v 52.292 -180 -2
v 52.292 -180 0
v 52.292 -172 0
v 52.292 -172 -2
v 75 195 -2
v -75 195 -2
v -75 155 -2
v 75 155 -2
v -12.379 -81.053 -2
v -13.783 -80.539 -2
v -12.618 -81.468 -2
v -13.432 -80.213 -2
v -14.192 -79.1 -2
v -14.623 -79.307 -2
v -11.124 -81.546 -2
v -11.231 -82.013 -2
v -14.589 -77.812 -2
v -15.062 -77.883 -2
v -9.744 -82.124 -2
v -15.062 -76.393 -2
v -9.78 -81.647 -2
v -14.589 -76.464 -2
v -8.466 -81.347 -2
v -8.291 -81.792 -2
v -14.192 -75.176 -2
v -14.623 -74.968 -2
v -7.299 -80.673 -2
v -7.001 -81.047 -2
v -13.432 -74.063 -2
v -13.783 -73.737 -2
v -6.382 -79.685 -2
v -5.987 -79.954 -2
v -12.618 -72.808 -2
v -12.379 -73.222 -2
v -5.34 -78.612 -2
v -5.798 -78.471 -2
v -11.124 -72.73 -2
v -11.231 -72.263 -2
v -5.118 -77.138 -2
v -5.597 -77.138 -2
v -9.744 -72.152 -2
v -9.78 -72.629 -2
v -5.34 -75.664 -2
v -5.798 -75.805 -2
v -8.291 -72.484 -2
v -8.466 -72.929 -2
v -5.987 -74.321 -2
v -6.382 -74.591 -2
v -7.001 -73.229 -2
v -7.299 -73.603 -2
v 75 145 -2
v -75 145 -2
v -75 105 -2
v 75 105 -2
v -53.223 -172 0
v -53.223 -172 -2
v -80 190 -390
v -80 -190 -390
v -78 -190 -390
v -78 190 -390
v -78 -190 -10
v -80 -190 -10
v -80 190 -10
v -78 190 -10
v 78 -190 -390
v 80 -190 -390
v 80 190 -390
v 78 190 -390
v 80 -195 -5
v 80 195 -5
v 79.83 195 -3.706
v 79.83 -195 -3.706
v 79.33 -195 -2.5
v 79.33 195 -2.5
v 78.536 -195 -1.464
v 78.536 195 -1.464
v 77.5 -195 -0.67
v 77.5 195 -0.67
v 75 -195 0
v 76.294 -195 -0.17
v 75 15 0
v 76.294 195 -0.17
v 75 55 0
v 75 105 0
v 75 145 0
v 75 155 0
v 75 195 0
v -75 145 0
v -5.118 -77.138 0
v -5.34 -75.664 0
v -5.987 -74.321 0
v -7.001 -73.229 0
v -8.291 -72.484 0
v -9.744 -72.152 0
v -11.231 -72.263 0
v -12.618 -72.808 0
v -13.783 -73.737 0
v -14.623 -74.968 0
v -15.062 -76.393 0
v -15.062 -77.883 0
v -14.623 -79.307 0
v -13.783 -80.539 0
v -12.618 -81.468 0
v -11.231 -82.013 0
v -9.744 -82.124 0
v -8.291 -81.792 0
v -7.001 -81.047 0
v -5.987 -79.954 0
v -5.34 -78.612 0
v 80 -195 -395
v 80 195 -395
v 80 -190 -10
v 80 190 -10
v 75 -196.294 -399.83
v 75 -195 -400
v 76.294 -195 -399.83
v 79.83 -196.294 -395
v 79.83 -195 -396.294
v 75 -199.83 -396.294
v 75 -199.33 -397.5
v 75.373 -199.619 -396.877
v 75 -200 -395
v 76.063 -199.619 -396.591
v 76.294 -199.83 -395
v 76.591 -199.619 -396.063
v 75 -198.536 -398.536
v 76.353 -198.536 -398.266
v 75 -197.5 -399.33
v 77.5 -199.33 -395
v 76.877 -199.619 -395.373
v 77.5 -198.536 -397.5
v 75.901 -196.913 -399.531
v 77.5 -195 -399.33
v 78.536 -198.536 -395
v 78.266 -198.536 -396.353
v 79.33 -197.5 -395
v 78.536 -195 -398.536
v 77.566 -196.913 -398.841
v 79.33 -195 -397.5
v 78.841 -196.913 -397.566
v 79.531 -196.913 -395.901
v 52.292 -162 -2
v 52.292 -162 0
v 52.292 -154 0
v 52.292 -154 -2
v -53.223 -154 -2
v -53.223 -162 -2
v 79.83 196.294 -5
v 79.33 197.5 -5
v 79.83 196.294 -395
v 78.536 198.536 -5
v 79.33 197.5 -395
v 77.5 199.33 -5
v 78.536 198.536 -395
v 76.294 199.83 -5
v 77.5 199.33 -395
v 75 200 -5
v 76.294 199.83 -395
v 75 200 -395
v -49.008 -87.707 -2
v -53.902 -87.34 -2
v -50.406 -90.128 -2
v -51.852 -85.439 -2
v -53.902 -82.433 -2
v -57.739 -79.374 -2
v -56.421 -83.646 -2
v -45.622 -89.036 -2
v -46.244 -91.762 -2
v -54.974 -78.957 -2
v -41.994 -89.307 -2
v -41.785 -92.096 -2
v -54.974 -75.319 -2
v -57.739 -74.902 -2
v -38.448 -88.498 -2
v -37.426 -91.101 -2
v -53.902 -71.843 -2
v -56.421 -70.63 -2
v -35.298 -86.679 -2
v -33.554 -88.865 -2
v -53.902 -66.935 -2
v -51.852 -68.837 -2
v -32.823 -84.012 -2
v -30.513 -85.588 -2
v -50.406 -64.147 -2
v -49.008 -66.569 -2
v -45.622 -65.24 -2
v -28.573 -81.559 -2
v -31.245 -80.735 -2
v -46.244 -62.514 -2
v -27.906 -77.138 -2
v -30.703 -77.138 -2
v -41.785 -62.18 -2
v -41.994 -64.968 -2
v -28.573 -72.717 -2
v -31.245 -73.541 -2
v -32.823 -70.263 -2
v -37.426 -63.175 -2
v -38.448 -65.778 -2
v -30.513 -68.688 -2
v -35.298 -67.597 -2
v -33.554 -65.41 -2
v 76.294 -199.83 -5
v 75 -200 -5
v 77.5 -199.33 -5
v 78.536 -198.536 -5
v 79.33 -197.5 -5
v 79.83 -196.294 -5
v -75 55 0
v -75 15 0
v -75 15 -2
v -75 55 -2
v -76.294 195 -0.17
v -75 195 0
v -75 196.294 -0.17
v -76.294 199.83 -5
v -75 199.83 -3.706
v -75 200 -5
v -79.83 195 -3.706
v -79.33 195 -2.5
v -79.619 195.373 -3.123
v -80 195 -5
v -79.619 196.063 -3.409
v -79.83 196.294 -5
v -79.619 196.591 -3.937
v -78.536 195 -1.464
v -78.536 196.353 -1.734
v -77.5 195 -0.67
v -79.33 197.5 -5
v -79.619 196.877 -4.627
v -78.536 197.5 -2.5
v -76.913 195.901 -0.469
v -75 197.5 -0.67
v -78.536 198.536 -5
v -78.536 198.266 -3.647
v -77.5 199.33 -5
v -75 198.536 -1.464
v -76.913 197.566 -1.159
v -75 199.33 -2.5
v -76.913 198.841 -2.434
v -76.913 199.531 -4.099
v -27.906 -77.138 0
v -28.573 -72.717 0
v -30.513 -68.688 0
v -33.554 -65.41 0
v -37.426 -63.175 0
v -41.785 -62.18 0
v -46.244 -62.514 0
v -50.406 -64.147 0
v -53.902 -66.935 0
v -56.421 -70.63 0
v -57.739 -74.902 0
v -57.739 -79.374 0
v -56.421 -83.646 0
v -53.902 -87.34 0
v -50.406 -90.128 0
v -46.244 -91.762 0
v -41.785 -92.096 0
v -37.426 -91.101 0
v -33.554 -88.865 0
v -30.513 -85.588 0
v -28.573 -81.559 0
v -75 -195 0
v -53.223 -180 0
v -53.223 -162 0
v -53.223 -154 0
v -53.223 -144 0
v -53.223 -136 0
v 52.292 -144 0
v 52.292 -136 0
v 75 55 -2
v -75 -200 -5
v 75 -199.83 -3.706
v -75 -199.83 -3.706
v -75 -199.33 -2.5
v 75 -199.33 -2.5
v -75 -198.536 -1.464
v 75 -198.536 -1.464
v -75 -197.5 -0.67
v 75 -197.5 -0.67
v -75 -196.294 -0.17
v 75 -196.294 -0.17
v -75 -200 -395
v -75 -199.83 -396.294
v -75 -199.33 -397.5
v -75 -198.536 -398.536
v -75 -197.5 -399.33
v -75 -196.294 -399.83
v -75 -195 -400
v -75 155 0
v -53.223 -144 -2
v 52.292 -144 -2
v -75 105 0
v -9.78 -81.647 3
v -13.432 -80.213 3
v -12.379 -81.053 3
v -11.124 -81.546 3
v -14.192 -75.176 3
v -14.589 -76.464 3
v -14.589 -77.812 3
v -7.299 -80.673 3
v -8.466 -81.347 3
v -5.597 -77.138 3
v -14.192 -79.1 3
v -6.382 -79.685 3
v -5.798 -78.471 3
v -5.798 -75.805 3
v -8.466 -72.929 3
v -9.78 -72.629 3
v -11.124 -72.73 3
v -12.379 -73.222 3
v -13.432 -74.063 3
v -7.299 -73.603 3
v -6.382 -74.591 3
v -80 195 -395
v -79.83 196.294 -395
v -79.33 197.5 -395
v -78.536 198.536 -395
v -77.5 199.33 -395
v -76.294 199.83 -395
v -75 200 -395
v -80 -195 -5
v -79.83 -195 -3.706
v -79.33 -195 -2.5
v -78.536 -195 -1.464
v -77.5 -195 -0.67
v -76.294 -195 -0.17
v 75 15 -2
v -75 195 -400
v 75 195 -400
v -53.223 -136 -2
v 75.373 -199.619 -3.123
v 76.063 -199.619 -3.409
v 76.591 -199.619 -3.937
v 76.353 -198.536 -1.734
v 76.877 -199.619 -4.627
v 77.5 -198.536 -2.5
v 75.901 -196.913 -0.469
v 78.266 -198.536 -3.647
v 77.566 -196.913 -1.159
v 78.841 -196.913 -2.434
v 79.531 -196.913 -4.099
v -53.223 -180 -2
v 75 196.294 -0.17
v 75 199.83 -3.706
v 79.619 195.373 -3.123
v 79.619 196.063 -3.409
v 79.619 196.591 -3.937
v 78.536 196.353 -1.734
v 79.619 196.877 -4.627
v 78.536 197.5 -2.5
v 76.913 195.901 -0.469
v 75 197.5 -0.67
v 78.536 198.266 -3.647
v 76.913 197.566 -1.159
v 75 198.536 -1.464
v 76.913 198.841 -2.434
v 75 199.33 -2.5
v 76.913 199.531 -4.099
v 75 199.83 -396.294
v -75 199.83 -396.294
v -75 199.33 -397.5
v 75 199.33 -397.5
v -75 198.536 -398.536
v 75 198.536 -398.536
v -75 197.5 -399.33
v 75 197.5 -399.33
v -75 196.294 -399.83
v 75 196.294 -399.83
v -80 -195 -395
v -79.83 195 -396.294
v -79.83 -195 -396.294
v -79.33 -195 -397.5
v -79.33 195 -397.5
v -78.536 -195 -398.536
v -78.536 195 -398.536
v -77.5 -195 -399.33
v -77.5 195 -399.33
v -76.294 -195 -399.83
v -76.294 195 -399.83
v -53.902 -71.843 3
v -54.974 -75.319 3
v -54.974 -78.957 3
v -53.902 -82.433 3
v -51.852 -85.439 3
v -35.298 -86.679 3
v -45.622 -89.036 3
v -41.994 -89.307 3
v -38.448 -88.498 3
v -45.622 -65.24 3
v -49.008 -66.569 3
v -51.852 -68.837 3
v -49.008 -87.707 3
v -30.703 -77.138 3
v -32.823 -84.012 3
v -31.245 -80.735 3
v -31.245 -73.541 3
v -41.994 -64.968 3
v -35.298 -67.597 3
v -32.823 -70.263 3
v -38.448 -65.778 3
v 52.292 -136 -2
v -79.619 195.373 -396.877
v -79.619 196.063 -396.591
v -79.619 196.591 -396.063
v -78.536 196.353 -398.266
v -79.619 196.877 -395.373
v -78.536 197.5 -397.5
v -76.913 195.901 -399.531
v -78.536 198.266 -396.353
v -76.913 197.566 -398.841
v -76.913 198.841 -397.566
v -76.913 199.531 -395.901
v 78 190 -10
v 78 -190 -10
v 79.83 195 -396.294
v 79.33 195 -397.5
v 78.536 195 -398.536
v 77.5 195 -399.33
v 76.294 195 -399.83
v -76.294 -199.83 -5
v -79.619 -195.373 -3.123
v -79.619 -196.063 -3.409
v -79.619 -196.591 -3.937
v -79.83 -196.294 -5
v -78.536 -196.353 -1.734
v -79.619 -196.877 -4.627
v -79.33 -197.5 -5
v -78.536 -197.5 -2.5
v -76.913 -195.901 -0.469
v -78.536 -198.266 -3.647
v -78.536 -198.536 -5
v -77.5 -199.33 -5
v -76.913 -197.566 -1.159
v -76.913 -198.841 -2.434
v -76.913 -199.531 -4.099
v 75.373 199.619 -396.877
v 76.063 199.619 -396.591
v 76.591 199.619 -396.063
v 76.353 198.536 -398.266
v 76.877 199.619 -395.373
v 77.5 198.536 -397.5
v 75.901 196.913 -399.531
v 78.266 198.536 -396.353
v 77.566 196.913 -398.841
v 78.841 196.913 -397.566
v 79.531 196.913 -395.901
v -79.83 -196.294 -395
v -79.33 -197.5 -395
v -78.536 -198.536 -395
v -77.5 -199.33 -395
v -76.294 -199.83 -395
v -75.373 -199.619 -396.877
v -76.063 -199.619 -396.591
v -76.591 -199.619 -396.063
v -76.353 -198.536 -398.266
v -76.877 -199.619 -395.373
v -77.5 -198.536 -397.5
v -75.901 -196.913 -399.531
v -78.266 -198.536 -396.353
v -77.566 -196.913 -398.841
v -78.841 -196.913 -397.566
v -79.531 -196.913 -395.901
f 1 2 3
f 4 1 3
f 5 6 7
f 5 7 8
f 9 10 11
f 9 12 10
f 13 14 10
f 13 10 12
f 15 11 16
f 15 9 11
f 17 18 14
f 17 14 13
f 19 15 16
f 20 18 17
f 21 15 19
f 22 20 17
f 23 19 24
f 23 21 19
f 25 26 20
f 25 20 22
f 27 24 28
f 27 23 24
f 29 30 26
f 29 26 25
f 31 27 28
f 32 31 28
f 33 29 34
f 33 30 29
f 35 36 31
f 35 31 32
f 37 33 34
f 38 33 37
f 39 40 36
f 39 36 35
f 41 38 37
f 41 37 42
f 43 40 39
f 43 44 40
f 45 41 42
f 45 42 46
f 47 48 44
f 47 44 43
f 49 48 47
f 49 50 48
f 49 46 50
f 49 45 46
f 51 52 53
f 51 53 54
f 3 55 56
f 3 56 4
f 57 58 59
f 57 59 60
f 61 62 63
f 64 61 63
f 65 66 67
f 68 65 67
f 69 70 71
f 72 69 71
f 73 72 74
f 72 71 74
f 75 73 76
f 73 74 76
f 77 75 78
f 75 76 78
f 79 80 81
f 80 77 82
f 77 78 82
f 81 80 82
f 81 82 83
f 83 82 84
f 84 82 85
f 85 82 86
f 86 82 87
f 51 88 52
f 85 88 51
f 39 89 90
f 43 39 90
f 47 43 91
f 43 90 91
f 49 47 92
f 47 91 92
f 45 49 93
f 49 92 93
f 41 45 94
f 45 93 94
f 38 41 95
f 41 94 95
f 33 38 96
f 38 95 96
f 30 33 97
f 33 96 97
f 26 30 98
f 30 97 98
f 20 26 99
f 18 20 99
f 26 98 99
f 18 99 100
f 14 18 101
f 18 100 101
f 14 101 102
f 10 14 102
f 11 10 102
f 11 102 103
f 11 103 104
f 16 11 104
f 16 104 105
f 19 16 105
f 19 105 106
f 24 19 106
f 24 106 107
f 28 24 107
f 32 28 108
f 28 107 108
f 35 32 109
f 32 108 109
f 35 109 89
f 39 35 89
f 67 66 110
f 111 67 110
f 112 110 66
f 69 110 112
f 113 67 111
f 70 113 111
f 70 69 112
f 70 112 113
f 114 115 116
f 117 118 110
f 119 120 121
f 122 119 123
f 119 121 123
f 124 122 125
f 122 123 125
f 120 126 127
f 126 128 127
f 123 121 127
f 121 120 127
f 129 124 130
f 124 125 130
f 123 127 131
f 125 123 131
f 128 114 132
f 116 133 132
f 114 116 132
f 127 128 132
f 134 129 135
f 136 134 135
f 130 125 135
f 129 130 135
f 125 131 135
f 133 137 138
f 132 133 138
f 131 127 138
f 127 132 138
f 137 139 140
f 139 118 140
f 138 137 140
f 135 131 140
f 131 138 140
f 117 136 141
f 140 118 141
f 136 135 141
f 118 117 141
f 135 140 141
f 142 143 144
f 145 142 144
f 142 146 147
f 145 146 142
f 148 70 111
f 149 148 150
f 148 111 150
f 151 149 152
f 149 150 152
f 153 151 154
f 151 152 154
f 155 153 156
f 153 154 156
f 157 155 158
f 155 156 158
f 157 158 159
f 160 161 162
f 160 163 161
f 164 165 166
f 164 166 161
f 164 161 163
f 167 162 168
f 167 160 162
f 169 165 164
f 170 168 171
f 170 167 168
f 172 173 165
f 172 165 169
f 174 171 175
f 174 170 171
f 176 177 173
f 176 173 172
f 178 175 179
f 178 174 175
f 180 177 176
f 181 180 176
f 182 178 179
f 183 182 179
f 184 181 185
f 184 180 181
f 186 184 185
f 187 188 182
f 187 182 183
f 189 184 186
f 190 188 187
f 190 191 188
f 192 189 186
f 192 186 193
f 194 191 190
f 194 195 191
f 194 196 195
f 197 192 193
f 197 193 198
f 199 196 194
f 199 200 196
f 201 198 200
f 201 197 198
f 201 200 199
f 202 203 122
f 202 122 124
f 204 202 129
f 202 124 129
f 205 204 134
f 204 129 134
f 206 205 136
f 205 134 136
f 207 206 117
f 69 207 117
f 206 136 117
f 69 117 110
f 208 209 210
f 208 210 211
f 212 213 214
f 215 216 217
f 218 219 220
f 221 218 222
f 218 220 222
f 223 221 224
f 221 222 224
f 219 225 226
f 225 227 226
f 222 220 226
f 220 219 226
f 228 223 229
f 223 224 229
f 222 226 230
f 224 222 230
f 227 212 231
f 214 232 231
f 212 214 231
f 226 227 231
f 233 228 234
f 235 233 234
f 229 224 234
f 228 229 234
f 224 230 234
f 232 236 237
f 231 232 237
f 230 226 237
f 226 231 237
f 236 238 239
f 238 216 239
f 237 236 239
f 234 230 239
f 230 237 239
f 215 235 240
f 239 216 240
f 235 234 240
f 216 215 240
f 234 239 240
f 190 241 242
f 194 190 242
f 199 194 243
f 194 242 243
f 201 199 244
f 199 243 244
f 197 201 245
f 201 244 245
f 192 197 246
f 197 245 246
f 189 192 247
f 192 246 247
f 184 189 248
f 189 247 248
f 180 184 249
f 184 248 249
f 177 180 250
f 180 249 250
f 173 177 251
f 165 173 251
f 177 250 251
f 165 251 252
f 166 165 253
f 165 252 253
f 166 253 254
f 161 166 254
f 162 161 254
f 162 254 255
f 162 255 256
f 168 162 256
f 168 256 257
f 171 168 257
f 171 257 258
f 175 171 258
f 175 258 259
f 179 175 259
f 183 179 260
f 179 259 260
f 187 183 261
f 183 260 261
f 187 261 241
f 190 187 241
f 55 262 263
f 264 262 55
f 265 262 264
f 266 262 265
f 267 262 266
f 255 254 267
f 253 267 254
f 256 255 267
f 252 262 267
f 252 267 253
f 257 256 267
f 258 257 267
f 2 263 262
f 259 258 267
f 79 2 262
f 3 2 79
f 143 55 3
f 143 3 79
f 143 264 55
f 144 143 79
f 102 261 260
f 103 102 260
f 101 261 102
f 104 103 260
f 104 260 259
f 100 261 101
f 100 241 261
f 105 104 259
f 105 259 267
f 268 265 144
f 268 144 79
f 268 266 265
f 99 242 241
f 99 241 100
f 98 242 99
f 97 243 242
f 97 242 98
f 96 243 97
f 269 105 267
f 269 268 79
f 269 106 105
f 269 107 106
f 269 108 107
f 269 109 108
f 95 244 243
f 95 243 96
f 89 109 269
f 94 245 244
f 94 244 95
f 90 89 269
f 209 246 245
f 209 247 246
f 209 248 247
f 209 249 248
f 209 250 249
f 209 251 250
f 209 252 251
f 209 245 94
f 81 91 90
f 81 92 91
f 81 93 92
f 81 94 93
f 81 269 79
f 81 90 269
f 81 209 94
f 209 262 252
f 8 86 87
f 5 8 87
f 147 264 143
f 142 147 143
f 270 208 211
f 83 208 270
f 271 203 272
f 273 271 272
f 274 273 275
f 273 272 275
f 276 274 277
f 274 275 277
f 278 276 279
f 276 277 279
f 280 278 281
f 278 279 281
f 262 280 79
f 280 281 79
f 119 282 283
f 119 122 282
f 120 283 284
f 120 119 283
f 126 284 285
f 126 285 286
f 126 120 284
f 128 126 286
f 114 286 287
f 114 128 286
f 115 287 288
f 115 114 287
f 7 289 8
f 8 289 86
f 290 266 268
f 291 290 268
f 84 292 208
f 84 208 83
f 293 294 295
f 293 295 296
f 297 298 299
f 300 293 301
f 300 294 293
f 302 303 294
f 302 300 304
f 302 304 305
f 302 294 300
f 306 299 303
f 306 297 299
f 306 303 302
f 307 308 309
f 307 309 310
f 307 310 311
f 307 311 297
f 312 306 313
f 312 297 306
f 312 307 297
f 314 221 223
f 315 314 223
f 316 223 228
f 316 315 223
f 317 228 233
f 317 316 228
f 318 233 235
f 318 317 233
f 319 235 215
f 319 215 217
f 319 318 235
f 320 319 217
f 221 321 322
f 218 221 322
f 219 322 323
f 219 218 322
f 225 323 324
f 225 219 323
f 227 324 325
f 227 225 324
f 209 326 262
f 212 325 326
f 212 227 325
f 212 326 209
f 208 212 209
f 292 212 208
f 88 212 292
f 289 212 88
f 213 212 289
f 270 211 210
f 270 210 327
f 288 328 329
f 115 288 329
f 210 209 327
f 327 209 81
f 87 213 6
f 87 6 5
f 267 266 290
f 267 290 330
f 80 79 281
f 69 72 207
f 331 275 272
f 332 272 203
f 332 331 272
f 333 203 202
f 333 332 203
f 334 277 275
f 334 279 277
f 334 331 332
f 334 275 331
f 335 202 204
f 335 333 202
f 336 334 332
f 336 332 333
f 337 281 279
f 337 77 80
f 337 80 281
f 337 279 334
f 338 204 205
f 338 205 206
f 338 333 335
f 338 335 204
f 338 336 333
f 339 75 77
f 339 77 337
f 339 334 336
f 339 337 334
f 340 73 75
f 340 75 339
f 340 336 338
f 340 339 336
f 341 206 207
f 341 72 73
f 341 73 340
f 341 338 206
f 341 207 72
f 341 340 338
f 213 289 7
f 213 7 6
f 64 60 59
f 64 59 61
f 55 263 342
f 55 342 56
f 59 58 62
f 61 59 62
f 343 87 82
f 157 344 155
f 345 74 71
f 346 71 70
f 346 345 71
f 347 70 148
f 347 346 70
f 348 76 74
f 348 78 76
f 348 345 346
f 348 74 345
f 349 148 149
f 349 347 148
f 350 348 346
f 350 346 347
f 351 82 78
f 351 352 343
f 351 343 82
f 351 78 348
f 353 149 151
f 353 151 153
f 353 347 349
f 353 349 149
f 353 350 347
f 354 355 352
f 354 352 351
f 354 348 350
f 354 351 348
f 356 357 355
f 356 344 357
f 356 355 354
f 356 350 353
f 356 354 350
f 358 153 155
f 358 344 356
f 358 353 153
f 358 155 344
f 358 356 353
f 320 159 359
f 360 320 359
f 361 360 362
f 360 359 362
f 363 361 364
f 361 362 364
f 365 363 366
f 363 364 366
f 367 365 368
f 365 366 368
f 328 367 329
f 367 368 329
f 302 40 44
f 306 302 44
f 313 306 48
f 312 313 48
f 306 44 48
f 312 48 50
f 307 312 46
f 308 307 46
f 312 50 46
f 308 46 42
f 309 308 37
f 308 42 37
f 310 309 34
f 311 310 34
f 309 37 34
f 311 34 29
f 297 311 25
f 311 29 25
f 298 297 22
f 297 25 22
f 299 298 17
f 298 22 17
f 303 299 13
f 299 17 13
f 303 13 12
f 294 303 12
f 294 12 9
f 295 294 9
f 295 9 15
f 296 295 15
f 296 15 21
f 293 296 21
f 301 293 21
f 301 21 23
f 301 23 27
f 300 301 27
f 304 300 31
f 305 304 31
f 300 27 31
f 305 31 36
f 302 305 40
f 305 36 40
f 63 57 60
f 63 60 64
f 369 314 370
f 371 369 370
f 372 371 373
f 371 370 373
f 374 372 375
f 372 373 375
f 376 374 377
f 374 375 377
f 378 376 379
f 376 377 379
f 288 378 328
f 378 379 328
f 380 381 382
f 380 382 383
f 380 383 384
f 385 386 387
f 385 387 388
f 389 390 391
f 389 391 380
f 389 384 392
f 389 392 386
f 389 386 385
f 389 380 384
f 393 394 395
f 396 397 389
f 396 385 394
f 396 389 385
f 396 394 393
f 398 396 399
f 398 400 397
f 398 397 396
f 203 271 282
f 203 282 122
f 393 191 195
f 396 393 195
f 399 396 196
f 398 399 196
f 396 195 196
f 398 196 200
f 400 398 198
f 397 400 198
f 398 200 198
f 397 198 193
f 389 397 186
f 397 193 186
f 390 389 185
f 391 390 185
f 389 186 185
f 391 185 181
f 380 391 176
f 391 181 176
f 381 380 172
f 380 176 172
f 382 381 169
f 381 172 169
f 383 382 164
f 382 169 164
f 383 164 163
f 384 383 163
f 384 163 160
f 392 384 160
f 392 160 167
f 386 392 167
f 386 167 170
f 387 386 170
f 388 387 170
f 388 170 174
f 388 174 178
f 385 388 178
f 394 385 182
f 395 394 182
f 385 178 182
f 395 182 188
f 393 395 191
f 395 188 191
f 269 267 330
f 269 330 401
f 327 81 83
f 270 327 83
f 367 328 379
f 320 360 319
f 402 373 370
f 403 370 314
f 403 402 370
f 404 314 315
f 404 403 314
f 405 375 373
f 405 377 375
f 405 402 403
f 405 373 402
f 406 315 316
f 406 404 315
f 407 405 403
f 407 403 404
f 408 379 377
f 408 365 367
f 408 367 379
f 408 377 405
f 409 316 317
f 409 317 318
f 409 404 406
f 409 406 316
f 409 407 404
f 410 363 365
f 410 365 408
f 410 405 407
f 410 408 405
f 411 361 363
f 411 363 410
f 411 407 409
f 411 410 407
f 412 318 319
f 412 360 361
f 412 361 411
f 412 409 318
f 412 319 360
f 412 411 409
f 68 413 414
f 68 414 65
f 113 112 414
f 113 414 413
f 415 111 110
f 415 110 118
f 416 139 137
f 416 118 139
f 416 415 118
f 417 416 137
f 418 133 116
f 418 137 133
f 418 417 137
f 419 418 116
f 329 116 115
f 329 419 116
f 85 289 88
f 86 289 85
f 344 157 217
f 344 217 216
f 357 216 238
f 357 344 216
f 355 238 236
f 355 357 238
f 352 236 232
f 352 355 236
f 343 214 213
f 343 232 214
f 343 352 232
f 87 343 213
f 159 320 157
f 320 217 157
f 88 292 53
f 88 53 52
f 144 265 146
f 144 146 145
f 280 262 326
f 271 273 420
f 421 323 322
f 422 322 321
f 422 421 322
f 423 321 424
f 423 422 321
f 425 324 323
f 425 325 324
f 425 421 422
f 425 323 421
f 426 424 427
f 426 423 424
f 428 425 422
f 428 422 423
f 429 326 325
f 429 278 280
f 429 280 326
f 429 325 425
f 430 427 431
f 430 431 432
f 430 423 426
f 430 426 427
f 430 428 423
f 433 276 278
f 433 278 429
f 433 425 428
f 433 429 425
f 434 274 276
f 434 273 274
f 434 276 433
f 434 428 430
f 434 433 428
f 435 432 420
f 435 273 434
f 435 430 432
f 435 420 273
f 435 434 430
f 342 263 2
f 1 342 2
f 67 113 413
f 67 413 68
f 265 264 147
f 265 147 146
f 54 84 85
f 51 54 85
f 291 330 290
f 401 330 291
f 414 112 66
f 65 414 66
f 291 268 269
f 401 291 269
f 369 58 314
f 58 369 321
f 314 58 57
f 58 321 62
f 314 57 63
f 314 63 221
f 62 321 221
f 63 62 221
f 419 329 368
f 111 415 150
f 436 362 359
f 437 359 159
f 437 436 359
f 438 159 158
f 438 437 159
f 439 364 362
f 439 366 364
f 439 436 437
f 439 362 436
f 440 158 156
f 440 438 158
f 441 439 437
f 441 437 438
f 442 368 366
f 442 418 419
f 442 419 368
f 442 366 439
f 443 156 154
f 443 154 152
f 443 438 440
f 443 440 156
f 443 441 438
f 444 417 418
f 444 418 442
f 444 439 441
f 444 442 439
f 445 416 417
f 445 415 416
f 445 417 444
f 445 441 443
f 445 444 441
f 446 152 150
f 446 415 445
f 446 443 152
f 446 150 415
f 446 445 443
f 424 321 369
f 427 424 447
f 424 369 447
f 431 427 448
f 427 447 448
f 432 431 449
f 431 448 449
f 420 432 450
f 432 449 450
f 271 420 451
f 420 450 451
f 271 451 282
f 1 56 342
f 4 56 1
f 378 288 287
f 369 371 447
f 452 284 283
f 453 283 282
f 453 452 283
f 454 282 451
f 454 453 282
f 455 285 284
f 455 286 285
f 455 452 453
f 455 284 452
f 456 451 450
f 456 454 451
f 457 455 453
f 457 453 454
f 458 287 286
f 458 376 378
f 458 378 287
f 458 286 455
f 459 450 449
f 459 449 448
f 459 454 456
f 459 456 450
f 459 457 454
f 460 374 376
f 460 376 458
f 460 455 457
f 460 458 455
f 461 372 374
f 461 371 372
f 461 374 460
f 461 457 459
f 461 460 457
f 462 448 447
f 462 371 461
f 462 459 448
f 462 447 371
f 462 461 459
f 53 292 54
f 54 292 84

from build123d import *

# Parameters (mm, degrees)
CROQUIS1_W              = 160
CROQUIS1_H              = 400
SALIENTE_EXTRUIR1_DEPTH = 400
REDONDEO1_R             = 5
CROQUIS2_R              = 15
CROQUIS2_R_2            = 5
CROQUIS2_W              = 150
CROQUIS2_H              = 40
CROQUIS2_W_2            = 105.514825976
CROQUIS2_H_2            = 8
CORTAR_EXTRUIR1_DEPTH   = 2
CROQUIS3_R              = 12.203694642
CROQUIS3_R_2            = 4.521298069
SALIENTE_EXTRUIR2_DEPTH = 5
CROQUIS4_W              = 380
CROQUIS4_H              = 380
CORTAR_EXTRUIR2_DEPTH   = 2
CROQUIS5_W              = 380
CROQUIS5_H              = 380
CORTAR_EXTRUIR3_DEPTH   = 2


with BuildPart() as part:
    # Croquis1 → Saliente-Extruir1 (new body)
    with BuildSketch(Plane.XY):
        Rectangle(CROQUIS1_W, CROQUIS1_H)
    extrude(amount=-SALIENTE_EXTRUIR1_DEPTH)

    # Redondeo1
    redondeo1_edges = [part.edges().sort_by_distance(p)[0] for p in [
        (80, 0, -400),
        (0, 200, -400),
        (-80, 0, -400),
        (0, 200, 0),
        (80, 0, 0),
        (0, -200, 0),
        (-80, 0, 0),
        (0, -200, -400),
        (-80, 200, -200),
        (80, 200, -200),
        (80, -200, -200),
        (-80, -200, -200),
    ]]
    fillet(redondeo1_edges, radius=REDONDEO1_R)

    # Croquis2 → Cortar-Extruir1 (cut)
    with BuildSketch(Plane.XY):
        with Locations((-42.906419047, -77.137880051)):
            Circle(CROQUIS2_R)
        with Locations((-10.118013228, -77.137880051)):
            Circle(CROQUIS2_R_2)
        with Locations((0, 175)):
            Rectangle(CROQUIS2_W, CROQUIS2_H)
        with Locations((0, 125)):
            Rectangle(CROQUIS2_W, CROQUIS2_H)
        with Locations((0, 35)):
            Rectangle(CROQUIS2_W, CROQUIS2_H)
        with Locations((-0.46526055, -176)):
            Rectangle(CROQUIS2_W_2, CROQUIS2_H_2)
        with Locations((-0.46526055, -158)):
            Rectangle(CROQUIS2_W_2, CROQUIS2_H_2)
        with Locations((-0.46526055, -140)):
            Rectangle(CROQUIS2_W_2, CROQUIS2_H_2)
    extrude(amount=-CORTAR_EXTRUIR1_DEPTH, mode=Mode.SUBTRACT)

    # Croquis3 → Saliente-Extruir2 (add)
    with BuildSketch(Plane.XY.offset(-2)):
        with Locations((-42.906419047, -77.137880051)):
            Circle(CROQUIS3_R)
        with Locations((-10.118013228, -77.137880051)):
            Circle(CROQUIS3_R_2)
    extrude(amount=SALIENTE_EXTRUIR2_DEPTH)

    # Croquis4 → Cortar-Extruir2 (cut)
    with BuildSketch(Plane.ZY.offset(80)):
        with Locations((-200, 0)):
            Rectangle(CROQUIS4_W, CROQUIS4_H)
    extrude(amount=-CORTAR_EXTRUIR2_DEPTH, mode=Mode.SUBTRACT)

    # Croquis5 → Cortar-Extruir3 (cut)
    with BuildSketch(Plane(origin=(80, 0, 0), x_dir=(0, 0, -1), z_dir=(1, 0, 0))):
        with Locations((200, 0)):
            Rectangle(CROQUIS5_W, CROQUIS5_H)
    extrude(amount=-CORTAR_EXTRUIR3_DEPTH, mode=Mode.SUBTRACT)


solid = part.part
